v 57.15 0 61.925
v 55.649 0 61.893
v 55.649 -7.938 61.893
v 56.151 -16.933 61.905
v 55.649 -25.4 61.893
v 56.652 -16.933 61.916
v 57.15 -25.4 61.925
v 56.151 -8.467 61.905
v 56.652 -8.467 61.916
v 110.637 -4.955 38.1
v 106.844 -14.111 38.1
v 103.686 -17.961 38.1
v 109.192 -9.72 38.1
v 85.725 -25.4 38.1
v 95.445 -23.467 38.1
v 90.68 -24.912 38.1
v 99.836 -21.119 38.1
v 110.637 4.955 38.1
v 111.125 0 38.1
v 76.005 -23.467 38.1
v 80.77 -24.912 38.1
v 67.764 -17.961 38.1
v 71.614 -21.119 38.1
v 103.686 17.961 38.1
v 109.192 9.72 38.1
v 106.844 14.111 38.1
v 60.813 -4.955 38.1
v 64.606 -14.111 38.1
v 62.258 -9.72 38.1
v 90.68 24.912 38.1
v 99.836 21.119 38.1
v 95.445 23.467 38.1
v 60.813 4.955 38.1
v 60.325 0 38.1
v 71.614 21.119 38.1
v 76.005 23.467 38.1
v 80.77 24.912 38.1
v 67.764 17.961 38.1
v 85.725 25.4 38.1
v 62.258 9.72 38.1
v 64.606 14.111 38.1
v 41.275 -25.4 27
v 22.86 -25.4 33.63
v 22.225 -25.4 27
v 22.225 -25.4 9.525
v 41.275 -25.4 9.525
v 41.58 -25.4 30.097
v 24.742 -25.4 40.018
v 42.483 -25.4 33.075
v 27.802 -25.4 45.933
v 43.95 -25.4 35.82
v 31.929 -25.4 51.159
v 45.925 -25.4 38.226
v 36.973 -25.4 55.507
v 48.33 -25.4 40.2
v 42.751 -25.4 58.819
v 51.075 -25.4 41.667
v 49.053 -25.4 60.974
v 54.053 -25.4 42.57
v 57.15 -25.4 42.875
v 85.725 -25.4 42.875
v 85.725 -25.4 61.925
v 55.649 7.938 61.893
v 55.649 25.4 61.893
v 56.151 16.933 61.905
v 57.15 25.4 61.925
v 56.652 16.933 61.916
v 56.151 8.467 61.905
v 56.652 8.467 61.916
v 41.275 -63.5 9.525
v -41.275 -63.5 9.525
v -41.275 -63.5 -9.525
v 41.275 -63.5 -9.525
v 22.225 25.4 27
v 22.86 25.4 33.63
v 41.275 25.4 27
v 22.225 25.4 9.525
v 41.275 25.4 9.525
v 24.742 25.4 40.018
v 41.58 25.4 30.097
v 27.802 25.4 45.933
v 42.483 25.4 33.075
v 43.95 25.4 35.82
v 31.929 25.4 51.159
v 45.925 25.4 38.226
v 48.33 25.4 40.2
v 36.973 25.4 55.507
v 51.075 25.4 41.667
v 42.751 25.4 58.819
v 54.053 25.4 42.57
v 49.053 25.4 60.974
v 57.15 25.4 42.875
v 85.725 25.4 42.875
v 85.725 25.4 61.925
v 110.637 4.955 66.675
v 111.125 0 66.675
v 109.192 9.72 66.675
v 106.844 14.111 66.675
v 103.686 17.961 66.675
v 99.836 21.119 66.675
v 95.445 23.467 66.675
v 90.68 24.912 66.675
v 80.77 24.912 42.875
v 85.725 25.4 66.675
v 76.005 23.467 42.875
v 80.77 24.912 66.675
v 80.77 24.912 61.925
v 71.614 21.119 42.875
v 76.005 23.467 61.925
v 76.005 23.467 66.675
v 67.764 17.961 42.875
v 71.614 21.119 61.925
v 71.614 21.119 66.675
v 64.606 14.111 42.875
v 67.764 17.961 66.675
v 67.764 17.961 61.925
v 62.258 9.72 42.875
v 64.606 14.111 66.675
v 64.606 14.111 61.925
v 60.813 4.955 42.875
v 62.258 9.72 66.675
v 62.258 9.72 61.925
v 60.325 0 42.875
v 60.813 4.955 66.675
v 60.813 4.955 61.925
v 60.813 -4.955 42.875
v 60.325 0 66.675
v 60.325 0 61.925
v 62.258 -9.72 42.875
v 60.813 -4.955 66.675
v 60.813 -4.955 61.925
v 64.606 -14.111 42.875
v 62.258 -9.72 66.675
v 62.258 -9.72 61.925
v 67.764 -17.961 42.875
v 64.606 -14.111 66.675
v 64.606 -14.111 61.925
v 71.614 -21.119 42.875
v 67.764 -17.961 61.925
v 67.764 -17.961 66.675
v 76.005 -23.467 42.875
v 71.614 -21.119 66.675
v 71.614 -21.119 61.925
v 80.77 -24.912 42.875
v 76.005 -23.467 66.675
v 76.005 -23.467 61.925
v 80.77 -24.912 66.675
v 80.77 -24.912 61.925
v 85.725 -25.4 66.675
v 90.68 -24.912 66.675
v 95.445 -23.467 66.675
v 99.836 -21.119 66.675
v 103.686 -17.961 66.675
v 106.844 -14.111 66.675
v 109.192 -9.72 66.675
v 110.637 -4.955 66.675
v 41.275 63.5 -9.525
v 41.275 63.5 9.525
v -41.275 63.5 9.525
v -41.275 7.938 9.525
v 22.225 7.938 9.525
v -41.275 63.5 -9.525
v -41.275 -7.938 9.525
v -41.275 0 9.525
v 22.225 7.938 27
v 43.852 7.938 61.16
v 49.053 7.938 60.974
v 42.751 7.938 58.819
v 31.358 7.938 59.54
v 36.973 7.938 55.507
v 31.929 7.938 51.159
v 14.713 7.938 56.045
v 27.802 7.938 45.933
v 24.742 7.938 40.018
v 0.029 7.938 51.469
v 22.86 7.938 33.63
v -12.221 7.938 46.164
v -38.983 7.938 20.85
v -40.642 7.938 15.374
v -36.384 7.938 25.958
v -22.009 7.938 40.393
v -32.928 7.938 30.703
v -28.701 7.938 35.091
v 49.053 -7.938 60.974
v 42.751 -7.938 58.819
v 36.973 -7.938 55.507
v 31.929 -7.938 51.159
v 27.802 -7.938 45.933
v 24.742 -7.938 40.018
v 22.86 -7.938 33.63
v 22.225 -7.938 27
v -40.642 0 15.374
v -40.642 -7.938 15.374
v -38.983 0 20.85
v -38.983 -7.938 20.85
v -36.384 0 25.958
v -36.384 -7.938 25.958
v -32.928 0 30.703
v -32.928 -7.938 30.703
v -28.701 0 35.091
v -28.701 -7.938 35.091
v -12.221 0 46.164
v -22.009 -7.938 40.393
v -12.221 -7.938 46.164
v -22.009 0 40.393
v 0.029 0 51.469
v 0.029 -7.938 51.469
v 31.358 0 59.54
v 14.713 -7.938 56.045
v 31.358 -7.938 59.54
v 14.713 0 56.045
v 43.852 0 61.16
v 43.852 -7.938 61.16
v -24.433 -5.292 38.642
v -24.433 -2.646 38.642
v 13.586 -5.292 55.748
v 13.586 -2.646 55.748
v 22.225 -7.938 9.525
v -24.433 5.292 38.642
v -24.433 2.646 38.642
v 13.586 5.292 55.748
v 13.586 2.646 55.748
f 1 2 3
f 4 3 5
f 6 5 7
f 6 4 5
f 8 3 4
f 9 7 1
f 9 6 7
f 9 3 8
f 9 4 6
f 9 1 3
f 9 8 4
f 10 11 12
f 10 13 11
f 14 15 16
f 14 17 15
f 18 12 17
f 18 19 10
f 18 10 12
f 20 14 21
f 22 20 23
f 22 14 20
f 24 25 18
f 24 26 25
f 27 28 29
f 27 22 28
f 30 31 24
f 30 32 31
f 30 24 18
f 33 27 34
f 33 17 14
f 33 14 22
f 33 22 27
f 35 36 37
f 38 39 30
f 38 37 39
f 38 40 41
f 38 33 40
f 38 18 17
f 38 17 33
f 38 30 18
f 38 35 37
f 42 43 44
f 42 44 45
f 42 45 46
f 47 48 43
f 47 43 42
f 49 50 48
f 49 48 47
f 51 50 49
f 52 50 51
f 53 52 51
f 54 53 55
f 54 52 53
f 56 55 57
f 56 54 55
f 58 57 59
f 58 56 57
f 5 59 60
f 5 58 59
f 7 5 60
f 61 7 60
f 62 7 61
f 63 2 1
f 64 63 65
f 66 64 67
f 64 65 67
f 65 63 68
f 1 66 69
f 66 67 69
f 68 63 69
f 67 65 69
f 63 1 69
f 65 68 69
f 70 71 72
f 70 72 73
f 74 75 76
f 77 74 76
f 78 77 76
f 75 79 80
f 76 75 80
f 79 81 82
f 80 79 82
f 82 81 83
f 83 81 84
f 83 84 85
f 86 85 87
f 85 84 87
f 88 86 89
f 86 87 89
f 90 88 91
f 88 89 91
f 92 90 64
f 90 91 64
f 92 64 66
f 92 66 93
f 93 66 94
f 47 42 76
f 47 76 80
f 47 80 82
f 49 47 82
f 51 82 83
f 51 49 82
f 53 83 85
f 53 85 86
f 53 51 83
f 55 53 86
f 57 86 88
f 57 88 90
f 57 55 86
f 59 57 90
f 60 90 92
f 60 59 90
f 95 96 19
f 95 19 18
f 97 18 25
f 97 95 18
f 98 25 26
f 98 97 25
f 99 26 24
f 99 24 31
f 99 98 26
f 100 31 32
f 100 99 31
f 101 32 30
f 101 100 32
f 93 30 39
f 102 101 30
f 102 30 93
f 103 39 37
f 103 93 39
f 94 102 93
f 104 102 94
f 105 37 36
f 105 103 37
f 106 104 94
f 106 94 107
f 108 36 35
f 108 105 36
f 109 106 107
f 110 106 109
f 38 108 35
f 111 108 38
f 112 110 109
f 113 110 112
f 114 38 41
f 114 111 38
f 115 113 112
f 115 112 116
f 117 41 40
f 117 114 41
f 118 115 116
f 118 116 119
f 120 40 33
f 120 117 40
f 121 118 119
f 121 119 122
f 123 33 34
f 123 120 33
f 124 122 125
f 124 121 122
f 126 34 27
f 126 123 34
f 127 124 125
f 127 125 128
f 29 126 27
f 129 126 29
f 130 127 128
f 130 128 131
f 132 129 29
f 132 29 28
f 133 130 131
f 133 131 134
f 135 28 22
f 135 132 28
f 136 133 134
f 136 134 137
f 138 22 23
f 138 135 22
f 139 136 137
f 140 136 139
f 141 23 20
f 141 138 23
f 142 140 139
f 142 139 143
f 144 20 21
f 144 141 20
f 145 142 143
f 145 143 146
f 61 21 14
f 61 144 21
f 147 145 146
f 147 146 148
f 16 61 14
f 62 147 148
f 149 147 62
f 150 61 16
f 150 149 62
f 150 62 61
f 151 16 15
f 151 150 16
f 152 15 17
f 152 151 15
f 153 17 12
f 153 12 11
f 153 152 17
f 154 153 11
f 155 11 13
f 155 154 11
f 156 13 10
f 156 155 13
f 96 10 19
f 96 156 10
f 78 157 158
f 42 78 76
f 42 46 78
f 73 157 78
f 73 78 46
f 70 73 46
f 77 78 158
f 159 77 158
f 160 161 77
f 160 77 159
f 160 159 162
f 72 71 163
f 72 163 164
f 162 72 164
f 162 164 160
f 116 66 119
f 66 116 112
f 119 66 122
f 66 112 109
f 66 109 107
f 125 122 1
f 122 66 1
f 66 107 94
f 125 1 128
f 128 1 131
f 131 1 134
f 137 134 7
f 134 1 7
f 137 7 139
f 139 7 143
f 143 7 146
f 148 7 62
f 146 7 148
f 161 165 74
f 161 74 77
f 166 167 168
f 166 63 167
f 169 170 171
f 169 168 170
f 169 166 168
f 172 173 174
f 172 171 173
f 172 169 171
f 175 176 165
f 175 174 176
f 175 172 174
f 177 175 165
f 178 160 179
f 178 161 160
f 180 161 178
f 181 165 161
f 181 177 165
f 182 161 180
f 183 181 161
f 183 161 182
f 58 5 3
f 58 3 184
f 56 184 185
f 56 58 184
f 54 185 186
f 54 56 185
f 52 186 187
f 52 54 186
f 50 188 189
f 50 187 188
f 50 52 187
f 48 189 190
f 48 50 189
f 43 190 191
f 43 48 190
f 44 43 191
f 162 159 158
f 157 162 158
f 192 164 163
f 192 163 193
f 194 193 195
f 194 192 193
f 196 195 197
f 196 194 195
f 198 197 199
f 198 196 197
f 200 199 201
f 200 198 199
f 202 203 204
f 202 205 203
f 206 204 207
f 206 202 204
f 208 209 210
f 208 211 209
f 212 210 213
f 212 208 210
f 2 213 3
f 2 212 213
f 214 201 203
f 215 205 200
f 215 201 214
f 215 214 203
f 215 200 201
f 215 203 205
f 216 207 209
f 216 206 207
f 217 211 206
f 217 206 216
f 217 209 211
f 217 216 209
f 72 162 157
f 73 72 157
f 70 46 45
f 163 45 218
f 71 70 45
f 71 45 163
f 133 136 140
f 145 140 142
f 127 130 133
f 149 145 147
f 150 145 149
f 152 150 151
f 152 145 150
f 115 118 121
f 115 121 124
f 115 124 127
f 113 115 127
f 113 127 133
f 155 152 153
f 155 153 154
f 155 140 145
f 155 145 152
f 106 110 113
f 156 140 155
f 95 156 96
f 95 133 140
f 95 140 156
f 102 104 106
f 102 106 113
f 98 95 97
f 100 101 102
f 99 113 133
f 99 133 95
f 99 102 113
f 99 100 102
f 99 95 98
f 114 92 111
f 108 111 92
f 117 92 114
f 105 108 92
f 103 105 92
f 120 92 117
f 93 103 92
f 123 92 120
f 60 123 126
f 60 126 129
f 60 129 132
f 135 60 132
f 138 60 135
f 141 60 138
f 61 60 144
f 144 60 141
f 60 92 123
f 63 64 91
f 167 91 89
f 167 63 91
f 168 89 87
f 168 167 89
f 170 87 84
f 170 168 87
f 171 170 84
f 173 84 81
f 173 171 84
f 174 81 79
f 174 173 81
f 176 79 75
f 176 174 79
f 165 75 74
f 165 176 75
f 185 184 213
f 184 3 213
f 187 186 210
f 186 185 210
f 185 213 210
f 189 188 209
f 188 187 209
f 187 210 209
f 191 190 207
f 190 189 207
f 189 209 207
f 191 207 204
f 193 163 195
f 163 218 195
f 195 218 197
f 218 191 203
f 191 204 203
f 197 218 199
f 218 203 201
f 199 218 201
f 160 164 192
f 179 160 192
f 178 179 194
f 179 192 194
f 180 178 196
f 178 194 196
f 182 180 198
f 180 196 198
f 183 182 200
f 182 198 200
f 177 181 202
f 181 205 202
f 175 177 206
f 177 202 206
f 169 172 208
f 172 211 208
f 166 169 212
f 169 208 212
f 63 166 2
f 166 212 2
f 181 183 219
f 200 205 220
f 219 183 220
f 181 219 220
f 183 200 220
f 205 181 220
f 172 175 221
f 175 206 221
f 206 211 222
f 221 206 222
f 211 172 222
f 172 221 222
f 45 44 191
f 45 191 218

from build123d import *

# Parameters (mm, degrees)
F1_DEPTH = 63.5
F2_DEPTH = 25.4
F0_W     = 25.4
F0_H     = 19.05
F3_DEPTH = 25.4
F4_DEPTH = 7.9375


with BuildPart() as f1:
    # F0 (on Front) → F1 (new body, symmetric)
    with BuildSketch(Plane.XZ):
        Polygon((-41.275, 9.525), (-41.275, -9.525), (41.275, -9.525), (41.275, 9.525), (22.225, 9.525), align=None)
    extrude(amount=F1_DEPTH, both=True)

    # F0 (on Front) → F2 (join, symmetric)
    with BuildSketch(Plane.XZ):
        with BuildLine():
            Line((22.225, 9.525), (41.275, 9.525))
            Line((41.275, 9.525), (41.275, 27.0002))
            ThreePointArc((41.275, 27.0002), (45.9246798487, 38.2255201513), (57.15, 42.8752))
            Line((57.15, 42.8752), (60.325, 42.8752))
            Line((60.325, 42.8752), (60.325, 61.9252))
            Line((60.325, 61.9252), (57.15, 61.9252))
            add(Edge.make_bspline(
                [(55.6487642721, 61.8929201045), (56.1526188138, 61.9062395272), (56.6530888928, 61.9169959284), (57.15, 61.9252)],
                knots=[110.0594590217, 110.0594590217, 110.0594590217, 110.0594590217, 111.5045361635, 111.5045361635, 111.5045361635, 111.5045361635], degree=3))
            ThreePointArc((55.6487642721, 61.8929201045), (31.9291129934, 51.1593076739), (22.225, 27.0002))
            Line((22.225, 27.0002), (22.225, 9.525))
        make_face()
    extrude(amount=F2_DEPTH, both=True)

    # F0 (on Front) → F3 (join, symmetric)
    with BuildSketch(Plane.XZ):
        with Locations((73.025, 52.4002)):
            Rectangle(F0_W, F0_H)
    extrude(amount=F3_DEPTH, both=True)

    # F0 (on Front) → F4 (join, symmetric)
    with BuildSketch(Plane.XZ):
        with BuildLine():
            add(Edge.make_bspline(
                [(-41.275, 9.525), (-40.7319258576, 44.9970073135), (17.2743711817, 60.8784908984), (55.6487642721, 61.8929201045)],
                knots=[0, 0, 0, 0, 110.0594590217, 110.0594590217, 110.0594590217, 110.0594590217], degree=3))
            Line((-41.275, 9.525), (22.225, 9.525))
            Line((22.225, 9.525), (22.225, 27.0002))
            ThreePointArc((22.225, 27.0002), (31.9291129934, 51.1593076739), (55.6487642721, 61.8929201045))
        make_face()
    extrude(amount=F4_DEPTH, both=True)

    # F0 (on Front) → F5 (revolve)
    with BuildSketch(Plane.XZ):
        Polygon((85.725, 66.675), (85.725, 61.9252), (85.725, 42.8752), (85.725, 38.1), (111.125, 38.1), (111.125, 66.675), align=None)
    revolve(axis=Axis((85.725, 0, 52.3875), (0, 0, 1)))


solid = f1.part
